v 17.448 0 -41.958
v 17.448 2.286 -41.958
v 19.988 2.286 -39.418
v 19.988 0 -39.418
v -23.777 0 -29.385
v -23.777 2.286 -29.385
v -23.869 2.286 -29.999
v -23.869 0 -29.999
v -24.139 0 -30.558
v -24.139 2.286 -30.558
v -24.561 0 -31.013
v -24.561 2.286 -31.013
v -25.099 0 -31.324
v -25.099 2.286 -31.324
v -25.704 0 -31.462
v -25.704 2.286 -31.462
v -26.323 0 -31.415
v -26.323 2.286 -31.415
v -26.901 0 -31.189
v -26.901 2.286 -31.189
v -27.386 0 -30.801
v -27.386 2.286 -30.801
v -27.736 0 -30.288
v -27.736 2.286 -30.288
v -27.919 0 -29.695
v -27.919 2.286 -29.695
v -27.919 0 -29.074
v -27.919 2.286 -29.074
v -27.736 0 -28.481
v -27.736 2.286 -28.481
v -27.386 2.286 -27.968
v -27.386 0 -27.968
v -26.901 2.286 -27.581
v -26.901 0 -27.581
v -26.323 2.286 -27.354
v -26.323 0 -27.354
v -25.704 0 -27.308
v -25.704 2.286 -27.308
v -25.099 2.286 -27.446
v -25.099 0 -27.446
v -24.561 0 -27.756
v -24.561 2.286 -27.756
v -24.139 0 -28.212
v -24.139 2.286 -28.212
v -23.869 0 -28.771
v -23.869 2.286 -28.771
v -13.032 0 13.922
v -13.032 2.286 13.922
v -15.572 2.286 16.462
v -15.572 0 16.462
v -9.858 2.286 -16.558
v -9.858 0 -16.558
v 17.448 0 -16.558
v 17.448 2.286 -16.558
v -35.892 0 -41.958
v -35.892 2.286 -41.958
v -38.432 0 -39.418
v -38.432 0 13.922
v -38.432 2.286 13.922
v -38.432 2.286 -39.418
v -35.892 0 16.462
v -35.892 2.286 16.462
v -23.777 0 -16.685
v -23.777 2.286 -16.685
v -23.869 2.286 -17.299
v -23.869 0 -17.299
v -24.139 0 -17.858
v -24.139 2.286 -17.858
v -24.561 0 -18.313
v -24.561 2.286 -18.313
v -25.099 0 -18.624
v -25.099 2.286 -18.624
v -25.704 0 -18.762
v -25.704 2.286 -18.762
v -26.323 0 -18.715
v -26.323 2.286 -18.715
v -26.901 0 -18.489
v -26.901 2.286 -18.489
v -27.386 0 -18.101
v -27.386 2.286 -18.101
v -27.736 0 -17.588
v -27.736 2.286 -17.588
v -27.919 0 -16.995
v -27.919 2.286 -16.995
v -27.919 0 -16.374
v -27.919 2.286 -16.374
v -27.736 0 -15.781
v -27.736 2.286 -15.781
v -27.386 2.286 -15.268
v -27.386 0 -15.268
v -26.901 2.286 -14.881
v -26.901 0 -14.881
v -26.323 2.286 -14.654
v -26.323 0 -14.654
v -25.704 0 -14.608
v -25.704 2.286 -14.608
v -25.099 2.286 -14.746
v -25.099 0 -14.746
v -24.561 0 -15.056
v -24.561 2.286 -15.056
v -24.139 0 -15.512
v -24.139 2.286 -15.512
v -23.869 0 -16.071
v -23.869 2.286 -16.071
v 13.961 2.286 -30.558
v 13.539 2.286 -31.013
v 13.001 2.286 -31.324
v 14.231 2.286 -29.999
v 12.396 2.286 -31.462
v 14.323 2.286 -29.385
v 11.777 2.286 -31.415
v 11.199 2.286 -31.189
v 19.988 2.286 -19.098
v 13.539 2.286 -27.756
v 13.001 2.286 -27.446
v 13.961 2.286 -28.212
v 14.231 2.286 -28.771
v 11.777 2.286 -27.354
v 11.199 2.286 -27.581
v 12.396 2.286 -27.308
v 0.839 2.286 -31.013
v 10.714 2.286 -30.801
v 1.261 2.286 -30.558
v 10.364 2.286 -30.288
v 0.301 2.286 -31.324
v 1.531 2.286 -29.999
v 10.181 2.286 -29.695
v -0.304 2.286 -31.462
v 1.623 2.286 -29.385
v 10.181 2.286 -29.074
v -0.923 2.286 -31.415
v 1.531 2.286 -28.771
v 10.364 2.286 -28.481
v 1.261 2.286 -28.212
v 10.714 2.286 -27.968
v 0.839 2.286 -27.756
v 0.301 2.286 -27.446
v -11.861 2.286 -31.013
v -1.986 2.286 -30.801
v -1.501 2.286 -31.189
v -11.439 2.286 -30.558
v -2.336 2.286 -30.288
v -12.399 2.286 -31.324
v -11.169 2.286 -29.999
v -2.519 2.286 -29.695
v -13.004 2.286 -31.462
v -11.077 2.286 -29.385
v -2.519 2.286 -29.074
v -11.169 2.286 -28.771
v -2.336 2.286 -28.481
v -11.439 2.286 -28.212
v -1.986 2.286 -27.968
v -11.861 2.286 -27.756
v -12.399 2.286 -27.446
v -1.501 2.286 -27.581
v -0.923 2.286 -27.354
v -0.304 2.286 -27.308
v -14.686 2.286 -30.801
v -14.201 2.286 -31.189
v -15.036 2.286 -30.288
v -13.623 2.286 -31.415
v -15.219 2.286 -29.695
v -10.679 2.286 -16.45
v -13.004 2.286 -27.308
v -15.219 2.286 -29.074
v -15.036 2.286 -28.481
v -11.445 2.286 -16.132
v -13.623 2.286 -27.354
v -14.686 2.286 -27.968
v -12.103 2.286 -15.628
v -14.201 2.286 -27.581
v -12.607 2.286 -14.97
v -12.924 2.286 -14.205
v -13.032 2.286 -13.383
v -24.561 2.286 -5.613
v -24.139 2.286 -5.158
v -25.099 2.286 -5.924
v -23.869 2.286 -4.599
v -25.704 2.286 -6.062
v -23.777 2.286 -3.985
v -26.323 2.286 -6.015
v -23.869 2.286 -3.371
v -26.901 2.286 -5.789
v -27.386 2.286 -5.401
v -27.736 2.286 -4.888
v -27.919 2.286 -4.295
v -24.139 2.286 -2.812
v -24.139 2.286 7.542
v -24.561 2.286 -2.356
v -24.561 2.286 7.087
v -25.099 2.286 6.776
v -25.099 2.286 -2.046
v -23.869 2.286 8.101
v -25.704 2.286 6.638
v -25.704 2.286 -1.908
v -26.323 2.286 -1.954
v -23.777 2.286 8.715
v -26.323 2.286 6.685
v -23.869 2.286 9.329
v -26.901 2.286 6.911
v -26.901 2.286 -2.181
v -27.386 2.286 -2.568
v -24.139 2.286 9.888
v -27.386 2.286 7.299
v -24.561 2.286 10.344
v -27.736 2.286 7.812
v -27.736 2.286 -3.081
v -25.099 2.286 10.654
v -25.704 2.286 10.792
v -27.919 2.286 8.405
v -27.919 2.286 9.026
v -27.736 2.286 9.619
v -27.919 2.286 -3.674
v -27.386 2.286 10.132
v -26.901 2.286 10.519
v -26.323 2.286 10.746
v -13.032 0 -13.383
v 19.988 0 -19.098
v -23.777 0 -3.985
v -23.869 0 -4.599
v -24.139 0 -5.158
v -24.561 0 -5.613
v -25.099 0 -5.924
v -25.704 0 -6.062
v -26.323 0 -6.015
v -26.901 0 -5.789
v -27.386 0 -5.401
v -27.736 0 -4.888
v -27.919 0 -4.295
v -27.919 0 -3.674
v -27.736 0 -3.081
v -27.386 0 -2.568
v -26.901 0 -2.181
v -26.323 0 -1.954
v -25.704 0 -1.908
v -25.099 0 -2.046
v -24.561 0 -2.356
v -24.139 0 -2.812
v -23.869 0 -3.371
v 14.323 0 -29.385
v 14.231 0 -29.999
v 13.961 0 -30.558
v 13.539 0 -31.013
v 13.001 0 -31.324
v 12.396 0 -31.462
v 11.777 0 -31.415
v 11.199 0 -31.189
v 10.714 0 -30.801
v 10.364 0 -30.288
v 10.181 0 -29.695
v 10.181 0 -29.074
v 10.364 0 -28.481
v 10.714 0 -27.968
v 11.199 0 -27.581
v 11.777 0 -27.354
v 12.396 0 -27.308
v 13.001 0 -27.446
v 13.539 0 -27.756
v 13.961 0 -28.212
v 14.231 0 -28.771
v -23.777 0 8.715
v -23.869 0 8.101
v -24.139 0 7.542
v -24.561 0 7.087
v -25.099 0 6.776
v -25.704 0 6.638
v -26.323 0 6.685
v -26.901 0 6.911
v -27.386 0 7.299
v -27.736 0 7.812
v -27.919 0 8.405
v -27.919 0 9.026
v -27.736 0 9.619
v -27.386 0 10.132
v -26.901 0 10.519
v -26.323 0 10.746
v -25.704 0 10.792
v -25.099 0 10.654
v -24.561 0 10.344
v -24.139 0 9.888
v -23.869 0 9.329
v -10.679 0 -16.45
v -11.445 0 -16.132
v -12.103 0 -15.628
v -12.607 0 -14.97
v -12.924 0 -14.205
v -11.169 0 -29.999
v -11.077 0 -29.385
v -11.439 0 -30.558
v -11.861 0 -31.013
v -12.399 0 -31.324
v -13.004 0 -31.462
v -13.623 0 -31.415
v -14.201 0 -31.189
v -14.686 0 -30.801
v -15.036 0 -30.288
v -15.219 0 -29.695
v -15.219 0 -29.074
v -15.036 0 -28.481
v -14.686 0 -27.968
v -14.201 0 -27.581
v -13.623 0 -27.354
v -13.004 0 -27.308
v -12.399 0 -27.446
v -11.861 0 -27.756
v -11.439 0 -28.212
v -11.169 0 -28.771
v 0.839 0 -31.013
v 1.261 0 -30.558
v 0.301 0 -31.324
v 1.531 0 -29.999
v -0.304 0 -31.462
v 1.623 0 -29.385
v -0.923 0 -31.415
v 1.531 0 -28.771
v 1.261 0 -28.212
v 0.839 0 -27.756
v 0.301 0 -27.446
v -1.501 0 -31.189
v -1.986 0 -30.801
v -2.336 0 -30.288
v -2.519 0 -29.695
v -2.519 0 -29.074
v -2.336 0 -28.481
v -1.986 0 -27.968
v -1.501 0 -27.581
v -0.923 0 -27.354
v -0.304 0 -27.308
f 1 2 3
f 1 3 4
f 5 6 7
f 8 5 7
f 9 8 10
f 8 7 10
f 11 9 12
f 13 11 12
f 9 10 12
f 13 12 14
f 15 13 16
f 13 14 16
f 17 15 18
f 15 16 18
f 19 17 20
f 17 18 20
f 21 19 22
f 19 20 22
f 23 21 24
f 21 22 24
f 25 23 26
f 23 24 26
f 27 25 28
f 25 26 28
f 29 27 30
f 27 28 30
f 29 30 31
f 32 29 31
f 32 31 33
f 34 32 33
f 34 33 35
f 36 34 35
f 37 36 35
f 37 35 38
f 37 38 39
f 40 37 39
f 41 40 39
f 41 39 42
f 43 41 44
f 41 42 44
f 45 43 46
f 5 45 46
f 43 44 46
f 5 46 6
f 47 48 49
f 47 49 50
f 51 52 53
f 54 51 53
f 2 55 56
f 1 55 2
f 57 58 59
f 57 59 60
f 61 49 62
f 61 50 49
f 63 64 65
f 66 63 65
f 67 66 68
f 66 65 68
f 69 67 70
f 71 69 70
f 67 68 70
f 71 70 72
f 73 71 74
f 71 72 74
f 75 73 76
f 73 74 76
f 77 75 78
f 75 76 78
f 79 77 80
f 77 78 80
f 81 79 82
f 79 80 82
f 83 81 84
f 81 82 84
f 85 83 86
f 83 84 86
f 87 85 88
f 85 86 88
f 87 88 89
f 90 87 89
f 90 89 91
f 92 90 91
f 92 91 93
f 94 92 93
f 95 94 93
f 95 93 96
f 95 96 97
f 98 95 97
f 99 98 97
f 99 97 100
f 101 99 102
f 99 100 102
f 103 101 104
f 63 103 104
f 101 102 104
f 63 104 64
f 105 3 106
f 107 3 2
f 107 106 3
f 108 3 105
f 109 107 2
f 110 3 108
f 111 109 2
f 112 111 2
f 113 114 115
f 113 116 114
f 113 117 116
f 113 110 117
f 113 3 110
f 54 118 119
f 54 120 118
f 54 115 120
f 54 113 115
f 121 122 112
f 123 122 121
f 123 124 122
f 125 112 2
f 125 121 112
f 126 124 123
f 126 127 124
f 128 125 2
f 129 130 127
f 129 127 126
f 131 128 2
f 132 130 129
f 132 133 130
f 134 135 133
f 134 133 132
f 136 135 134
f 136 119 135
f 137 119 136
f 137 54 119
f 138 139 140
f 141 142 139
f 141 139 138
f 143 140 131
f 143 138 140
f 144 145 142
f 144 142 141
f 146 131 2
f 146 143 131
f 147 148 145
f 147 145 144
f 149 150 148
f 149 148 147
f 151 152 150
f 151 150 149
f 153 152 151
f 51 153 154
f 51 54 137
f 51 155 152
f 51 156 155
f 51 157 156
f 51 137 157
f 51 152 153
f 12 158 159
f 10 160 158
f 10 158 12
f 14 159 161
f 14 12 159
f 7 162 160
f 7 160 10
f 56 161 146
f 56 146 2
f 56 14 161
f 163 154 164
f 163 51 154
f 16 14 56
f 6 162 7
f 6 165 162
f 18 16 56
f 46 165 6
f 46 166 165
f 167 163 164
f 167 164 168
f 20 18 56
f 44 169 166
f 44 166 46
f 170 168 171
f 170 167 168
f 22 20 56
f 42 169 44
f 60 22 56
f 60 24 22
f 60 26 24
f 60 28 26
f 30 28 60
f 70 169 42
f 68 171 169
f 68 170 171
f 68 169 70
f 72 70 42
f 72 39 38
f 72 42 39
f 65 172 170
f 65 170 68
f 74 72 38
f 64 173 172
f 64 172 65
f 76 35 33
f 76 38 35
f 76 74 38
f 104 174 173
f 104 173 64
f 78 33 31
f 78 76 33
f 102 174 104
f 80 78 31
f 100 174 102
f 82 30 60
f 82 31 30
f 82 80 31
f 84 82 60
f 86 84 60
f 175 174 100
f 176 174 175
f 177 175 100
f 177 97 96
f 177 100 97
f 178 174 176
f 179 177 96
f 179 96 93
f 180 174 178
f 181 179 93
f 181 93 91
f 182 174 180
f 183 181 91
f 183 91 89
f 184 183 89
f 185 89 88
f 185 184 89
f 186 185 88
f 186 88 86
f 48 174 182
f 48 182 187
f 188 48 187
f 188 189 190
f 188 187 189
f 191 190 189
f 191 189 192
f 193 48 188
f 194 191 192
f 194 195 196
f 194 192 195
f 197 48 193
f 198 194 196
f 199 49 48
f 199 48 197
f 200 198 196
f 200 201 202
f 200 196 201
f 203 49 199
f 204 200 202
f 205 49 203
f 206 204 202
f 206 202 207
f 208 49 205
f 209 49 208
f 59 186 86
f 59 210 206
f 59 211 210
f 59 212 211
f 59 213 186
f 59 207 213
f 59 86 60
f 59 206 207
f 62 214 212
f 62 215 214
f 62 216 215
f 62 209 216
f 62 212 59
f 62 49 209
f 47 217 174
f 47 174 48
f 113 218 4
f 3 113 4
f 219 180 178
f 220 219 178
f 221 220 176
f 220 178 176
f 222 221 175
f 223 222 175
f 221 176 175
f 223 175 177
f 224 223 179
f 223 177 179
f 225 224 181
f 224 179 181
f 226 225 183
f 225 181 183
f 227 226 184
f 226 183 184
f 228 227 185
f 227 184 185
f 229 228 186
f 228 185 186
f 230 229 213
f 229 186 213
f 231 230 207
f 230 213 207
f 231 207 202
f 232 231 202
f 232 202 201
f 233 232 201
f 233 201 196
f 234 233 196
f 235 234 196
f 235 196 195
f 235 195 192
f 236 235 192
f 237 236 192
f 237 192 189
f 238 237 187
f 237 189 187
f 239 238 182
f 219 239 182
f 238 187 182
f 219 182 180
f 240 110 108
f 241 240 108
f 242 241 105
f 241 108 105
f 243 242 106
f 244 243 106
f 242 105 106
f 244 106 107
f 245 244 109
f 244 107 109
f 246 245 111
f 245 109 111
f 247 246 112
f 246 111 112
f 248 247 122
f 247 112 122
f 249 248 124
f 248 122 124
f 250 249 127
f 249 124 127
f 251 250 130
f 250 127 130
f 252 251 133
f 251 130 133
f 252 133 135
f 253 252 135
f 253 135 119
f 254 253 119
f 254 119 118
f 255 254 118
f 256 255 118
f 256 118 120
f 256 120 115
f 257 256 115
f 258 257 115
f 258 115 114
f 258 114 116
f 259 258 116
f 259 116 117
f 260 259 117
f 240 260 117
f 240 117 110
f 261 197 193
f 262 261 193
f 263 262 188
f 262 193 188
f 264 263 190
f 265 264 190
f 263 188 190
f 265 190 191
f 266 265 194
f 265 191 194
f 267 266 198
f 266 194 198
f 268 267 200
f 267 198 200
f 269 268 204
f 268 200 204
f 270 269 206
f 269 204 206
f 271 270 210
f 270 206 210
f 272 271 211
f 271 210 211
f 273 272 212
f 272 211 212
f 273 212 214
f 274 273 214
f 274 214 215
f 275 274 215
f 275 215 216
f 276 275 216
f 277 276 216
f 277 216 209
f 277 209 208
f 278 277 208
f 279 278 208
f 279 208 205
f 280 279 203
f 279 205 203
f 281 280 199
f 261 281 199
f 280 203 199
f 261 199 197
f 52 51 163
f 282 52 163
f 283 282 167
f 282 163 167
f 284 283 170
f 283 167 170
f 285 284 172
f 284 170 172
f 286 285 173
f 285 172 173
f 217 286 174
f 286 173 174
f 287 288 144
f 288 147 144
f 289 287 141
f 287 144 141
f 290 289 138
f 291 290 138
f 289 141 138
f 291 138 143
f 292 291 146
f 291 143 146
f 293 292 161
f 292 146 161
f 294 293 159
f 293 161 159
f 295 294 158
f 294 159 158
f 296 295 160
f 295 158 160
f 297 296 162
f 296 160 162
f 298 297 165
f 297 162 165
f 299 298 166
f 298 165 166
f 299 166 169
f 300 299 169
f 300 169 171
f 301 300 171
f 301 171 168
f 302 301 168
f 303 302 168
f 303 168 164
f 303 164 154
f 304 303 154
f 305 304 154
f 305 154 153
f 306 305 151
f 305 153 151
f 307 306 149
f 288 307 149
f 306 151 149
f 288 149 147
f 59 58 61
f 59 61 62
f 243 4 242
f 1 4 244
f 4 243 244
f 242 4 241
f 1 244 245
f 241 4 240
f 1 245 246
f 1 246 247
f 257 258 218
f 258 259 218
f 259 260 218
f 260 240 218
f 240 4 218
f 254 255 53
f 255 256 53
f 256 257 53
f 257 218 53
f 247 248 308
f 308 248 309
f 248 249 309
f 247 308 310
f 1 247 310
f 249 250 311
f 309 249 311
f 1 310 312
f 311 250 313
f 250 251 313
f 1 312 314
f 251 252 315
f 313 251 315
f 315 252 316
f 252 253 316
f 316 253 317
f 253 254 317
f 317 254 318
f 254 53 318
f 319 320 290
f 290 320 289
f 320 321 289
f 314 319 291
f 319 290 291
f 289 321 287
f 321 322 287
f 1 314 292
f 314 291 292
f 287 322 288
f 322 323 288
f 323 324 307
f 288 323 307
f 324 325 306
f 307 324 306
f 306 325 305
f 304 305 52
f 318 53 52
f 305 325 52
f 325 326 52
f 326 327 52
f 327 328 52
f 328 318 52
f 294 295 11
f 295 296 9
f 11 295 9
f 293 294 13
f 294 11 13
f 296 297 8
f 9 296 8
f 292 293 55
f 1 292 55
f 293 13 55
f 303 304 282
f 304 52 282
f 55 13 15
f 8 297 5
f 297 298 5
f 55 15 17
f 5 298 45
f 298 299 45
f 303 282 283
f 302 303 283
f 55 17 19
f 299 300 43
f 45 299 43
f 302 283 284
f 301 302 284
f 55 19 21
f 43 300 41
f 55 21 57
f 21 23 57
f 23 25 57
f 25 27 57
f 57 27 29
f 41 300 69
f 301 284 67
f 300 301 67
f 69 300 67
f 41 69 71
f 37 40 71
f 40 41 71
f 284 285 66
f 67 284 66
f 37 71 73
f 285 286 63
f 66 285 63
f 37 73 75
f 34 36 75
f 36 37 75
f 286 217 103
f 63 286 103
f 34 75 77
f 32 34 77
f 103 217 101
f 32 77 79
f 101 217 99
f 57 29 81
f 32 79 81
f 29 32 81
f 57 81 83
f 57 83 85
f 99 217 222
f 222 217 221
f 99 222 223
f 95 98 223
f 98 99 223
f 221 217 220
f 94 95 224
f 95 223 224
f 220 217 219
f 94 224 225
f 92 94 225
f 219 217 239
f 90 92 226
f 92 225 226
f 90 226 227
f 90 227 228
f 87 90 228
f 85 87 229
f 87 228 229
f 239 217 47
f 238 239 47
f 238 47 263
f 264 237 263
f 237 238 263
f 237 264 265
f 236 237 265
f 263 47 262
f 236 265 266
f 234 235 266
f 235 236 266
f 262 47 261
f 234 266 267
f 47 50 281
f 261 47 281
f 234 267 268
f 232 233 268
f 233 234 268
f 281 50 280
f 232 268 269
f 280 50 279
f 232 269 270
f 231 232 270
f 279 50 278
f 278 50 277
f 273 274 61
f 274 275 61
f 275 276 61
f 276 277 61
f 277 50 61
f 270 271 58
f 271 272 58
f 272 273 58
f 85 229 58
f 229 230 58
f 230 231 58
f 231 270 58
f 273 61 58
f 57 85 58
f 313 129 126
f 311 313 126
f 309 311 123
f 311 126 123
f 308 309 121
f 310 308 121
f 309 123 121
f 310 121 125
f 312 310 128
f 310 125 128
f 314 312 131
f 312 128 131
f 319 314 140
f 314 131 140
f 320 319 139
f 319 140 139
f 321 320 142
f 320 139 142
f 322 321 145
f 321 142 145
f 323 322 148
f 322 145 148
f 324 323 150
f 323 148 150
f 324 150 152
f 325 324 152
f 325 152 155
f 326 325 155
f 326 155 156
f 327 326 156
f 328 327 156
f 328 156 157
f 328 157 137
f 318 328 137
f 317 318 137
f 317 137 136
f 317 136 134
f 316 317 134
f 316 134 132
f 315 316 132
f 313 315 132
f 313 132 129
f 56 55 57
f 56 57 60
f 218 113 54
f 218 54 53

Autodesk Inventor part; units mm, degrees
ref_plane "YZ Plane" through (0, 0, 0) normal (1, 0, 0) x (0, 1, 0)
ref_plane "XZ Plane" through (0, 0, 0) normal (0, 1, 0) x (-1, 0, 0)
ref_plane "XY Plane" through (0, 0, 0) normal (0, 0, 1) x (1, 0, 0)
sketch "Sketch1" plane through (0, 0, 0) normal (0, 1, 0) x (-1, 0, 0)
  line L0 (38.4325, -41.9578) -> (13.0325, -41.9578)
  line L1 (13.0325, -41.9578) -> (13.0325, 16.4622)
  line L2 (13.0325, 16.4622) -> (38.4325, 16.4622)
  line L3 (38.4325, 16.4622) -> (38.4325, -41.9578)
  line L4 (38.4325, -41.9578) -> (-9.6784, 6.153) construction
  line L5 (38.4325, -41.9578) -> (38.4325, -16.5578)
  line L6 (38.4325, -16.5578) -> (-19.9875, -16.5578)
  line L7 (-19.9875, -16.5578) -> (-19.9875, -41.9578)
  line L8 (-19.9875, -41.9578) -> (38.4325, -41.9578)
  point P0 (0, 0)
  point P1 (13.0325, -16.5578)
  dimension "d0" = 25.4
  dimension "d1" = 58.42
  dimension "d2" = 45
extrude "Extrusion1" add sketch "Sketch1" along normal blind 2.286
chamfer "Chamfer1" distance 2.54 angle 45 1 edges at (-13.0325, 1.143, 16.4622)
chamfer "Chamfer2" distance 2.54 angle 45 4 edges at (-38.4325, 1.143, 16.4622) (19.9875, 1.143, -16.5578) (19.9875, 1.143, -41.9578) (-38.4325, 1.143, -41.9578)
fillet "Fillet1" radius 3.175 1 edges at (-13.0325, 1.143, -16.5578)
sketch "Sketch2" plane through (0, 2.286, 0) normal (0, 1, 0) x (1, 0, 0)
  circle A0 centre (-25.8595, 29.3848) radius 2.0828
  line L0 (17.4475, 41.9578) -> (-35.8925, 41.9578) projected
  line L1 (19.9875, 19.0978) -> (19.9875, 39.4178) projected
  line L2 (-38.4325, 39.4178) -> (-38.4325, -13.9222) projected
  point P0 (0, 0)
  dimension "d12" = 12.573
  dimension "d14" = 4.1656
  dimension "d23" = 12.573
extrude "Extrusion2" cut sketch "Sketch2" against normal blind 2.286
pattern_linear "Rectangular Pattern1" count 5 spacing 12.7 along (0, 0, 1) of "Extrusion2"
pattern_linear "Rectangular Pattern2" count 5 spacing 12.7 along (1, 0, 0) of "Extrusion2"
properties part number "ShortenedVersaGusset 90o"
